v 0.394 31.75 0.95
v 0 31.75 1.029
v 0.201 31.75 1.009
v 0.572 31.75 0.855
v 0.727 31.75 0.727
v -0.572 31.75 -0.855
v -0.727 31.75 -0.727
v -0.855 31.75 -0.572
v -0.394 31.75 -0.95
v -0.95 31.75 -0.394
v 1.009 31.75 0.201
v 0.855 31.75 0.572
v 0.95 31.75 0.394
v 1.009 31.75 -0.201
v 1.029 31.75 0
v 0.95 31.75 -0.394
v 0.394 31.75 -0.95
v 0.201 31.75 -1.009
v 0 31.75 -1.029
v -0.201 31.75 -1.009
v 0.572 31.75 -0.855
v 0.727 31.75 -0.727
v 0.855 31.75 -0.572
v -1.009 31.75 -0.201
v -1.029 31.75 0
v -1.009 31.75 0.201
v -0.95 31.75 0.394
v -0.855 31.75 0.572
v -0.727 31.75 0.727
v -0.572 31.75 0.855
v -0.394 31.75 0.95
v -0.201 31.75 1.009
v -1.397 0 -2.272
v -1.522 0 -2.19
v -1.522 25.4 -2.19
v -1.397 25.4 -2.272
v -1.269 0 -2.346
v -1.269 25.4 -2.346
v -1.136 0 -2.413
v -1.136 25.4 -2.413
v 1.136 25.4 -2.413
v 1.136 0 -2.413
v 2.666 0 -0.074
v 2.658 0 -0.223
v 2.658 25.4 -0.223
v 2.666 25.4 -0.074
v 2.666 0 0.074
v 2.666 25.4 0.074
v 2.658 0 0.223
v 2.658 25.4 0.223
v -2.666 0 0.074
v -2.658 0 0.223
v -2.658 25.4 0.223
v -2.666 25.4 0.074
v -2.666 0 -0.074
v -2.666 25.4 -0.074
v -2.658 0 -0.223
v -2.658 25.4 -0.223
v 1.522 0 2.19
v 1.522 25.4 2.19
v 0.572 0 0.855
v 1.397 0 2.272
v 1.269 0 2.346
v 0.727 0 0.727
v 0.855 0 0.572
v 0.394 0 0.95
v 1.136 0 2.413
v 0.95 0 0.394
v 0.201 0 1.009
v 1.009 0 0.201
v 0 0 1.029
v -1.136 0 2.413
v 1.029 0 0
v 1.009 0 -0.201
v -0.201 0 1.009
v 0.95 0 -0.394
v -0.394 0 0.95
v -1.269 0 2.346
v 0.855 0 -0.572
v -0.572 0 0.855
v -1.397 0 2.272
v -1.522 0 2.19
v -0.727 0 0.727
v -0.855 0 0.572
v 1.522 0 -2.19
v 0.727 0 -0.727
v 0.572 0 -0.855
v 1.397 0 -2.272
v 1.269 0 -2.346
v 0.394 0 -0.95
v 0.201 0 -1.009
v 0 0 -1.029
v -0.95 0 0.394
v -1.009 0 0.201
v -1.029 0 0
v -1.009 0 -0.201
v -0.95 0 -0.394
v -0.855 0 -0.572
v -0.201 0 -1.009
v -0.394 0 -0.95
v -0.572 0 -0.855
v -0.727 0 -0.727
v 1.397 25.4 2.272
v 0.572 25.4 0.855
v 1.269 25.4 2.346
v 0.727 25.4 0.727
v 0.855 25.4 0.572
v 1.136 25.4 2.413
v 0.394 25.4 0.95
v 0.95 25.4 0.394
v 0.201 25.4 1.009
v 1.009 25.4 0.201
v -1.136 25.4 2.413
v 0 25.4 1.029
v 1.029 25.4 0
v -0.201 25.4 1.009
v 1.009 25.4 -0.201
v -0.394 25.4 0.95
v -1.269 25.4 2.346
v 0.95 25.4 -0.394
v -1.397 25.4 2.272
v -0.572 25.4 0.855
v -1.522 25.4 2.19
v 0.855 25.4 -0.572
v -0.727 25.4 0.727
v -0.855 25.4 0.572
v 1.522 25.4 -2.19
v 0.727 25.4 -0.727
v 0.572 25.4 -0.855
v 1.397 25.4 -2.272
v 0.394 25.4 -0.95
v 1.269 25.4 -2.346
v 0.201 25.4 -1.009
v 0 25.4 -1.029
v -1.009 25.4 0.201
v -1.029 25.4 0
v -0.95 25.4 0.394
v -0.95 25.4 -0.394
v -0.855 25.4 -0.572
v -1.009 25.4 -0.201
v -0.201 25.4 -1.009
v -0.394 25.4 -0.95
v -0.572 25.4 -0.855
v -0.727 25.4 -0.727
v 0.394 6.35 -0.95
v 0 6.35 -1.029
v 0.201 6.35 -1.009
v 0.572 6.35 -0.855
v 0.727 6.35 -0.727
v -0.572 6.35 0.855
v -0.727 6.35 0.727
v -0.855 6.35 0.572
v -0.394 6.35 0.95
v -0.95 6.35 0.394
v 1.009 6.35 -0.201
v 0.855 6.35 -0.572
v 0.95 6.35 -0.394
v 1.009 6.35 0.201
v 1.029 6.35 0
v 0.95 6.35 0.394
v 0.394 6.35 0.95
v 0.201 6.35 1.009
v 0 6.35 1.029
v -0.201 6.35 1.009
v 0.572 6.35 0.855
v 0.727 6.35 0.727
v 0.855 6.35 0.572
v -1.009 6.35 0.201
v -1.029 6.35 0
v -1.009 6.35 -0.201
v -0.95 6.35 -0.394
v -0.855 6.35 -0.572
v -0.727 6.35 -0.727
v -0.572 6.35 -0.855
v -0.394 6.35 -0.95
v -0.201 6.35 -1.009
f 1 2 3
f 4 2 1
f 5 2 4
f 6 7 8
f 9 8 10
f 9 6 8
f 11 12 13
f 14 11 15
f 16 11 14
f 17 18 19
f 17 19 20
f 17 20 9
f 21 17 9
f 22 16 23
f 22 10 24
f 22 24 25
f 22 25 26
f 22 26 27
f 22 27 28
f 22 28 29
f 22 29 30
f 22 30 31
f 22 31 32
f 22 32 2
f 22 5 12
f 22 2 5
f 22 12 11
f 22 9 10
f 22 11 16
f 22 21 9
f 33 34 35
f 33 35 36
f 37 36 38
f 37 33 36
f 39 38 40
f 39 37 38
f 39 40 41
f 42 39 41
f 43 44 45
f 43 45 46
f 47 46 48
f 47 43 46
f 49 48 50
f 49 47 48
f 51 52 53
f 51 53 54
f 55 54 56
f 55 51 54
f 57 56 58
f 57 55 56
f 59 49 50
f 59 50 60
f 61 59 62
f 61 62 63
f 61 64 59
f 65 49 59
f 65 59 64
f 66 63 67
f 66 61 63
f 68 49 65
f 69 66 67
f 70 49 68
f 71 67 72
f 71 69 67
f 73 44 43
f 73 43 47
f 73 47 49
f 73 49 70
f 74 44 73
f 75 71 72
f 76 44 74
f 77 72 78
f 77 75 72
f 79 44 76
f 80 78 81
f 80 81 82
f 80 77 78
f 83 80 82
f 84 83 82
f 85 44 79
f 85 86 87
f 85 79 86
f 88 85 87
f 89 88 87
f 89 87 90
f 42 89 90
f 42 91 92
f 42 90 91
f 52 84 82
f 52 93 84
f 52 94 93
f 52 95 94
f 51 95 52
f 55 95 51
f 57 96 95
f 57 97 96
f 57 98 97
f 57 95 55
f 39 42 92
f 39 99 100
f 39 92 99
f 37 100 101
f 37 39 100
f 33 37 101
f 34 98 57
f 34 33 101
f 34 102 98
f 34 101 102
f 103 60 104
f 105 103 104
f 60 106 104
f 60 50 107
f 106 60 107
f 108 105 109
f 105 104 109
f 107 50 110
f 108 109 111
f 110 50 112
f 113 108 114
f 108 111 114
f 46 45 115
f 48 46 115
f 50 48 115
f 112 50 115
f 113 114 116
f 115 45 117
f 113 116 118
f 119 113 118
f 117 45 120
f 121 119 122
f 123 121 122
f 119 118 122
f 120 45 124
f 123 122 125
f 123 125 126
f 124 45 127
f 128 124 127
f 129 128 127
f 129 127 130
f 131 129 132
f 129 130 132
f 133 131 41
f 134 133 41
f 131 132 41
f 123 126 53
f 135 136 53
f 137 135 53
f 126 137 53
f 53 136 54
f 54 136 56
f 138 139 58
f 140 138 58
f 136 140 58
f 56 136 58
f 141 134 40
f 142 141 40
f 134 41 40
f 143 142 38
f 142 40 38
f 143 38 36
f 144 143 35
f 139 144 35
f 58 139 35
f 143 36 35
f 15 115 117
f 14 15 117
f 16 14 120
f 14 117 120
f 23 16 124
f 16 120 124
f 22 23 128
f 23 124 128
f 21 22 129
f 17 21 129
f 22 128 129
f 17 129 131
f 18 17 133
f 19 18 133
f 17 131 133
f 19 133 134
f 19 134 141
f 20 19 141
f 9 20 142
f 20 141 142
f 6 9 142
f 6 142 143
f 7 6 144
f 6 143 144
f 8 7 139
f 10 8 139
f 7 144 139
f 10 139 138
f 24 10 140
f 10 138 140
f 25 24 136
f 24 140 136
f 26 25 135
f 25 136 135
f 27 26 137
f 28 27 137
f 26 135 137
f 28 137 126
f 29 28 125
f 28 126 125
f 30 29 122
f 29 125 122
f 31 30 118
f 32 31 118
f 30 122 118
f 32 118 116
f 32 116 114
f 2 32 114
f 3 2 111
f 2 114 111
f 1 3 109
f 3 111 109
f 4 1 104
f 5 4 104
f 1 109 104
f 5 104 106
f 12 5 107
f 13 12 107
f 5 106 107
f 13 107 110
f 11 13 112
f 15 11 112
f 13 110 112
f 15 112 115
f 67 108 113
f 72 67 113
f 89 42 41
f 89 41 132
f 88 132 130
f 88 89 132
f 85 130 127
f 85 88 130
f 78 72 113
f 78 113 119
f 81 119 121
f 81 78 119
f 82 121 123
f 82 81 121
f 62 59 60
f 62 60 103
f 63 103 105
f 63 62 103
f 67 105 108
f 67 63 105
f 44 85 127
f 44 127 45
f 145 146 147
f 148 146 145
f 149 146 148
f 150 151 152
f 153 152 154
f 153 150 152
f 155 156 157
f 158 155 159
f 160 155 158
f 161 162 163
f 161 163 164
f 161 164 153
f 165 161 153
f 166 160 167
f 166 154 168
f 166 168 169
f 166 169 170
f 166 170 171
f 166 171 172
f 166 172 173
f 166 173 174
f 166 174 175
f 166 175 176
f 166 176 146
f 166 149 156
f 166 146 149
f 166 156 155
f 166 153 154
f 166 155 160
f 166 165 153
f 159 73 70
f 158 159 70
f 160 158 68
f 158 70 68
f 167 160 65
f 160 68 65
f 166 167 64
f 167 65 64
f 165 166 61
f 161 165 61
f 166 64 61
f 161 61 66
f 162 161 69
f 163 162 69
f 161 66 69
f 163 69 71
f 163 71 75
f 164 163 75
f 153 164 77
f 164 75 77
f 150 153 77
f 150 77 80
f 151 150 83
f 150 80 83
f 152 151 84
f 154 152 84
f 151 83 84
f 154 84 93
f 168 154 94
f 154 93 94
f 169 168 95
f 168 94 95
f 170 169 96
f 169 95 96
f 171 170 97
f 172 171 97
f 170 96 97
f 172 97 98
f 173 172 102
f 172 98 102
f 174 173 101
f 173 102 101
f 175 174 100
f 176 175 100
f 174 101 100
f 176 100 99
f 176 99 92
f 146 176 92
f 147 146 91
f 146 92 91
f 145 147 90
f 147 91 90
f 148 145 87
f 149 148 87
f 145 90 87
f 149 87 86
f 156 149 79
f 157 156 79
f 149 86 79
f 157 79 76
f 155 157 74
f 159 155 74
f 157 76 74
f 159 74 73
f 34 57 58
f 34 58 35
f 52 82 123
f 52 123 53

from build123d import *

# Parameters (mm, degrees)
BOSS_EXTRUDE1_DEPTH = 25.4
SKETCH2_R           = 1.0287
BOSS_EXTRUDE2_DEPTH = 6.35
SKETCH3_R           = 1.0287
CUT_EXTRUDE1_DEPTH  = 6.35


with BuildPart() as part:
    # Sketch1 → Boss-Extrude1 (new body)
    with BuildSketch(Plane(origin=(0, 0, 0), x_dir=(1, 0, 0), z_dir=(0, 1, 0))):
        with BuildLine():
            Line((-1.135922533, 2.413), (1.135922533, 2.413))
            ThreePointArc((1.135922533, 2.413), (1.3335, 2.309689752), (1.521758033, 2.19023777))
            Line((1.521758033, 2.19023777), (2.657680566, 0.22276223))
            ThreePointArc((2.657680566, 0.22276223), (2.667, 0), (2.657680566, -0.22276223))
            Line((2.657680566, -0.22276223), (1.521758033, -2.19023777))
            ThreePointArc((1.521758033, -2.19023777), (1.3335, -2.309689752), (1.135922533, -2.413))
            Line((1.135922533, -2.413), (-1.135922533, -2.413))
            ThreePointArc((-1.135922533, -2.413), (-1.3335, -2.309689752), (-1.521758033, -2.19023777))
            Line((-1.521758033, -2.19023777), (-2.657680566, -0.22276223))
            ThreePointArc((-2.657680566, -0.22276223), (-2.667, 0), (-2.657680566, 0.22276223))
            Line((-2.657680566, 0.22276223), (-1.521758033, 2.19023777))
            ThreePointArc((-1.521758033, 2.19023777), (-1.3335, 2.309689752), (-1.135922533, 2.413))
        make_face()
    extrude(amount=BOSS_EXTRUDE1_DEPTH)

    # Sketch2 → Boss-Extrude2 (add)
    with BuildSketch(Plane(origin=(0, 25.4, 0), x_dir=(1, 0, 0), z_dir=(0, 1, 0))):
        Circle(SKETCH2_R)
    extrude(amount=BOSS_EXTRUDE2_DEPTH)

    # Sketch3 → Cut-Extrude1 (cut)
    with BuildSketch(Plane.XZ):
        Circle(SKETCH3_R)
    extrude(amount=-CUT_EXTRUDE1_DEPTH, mode=Mode.SUBTRACT)


solid = part.part
